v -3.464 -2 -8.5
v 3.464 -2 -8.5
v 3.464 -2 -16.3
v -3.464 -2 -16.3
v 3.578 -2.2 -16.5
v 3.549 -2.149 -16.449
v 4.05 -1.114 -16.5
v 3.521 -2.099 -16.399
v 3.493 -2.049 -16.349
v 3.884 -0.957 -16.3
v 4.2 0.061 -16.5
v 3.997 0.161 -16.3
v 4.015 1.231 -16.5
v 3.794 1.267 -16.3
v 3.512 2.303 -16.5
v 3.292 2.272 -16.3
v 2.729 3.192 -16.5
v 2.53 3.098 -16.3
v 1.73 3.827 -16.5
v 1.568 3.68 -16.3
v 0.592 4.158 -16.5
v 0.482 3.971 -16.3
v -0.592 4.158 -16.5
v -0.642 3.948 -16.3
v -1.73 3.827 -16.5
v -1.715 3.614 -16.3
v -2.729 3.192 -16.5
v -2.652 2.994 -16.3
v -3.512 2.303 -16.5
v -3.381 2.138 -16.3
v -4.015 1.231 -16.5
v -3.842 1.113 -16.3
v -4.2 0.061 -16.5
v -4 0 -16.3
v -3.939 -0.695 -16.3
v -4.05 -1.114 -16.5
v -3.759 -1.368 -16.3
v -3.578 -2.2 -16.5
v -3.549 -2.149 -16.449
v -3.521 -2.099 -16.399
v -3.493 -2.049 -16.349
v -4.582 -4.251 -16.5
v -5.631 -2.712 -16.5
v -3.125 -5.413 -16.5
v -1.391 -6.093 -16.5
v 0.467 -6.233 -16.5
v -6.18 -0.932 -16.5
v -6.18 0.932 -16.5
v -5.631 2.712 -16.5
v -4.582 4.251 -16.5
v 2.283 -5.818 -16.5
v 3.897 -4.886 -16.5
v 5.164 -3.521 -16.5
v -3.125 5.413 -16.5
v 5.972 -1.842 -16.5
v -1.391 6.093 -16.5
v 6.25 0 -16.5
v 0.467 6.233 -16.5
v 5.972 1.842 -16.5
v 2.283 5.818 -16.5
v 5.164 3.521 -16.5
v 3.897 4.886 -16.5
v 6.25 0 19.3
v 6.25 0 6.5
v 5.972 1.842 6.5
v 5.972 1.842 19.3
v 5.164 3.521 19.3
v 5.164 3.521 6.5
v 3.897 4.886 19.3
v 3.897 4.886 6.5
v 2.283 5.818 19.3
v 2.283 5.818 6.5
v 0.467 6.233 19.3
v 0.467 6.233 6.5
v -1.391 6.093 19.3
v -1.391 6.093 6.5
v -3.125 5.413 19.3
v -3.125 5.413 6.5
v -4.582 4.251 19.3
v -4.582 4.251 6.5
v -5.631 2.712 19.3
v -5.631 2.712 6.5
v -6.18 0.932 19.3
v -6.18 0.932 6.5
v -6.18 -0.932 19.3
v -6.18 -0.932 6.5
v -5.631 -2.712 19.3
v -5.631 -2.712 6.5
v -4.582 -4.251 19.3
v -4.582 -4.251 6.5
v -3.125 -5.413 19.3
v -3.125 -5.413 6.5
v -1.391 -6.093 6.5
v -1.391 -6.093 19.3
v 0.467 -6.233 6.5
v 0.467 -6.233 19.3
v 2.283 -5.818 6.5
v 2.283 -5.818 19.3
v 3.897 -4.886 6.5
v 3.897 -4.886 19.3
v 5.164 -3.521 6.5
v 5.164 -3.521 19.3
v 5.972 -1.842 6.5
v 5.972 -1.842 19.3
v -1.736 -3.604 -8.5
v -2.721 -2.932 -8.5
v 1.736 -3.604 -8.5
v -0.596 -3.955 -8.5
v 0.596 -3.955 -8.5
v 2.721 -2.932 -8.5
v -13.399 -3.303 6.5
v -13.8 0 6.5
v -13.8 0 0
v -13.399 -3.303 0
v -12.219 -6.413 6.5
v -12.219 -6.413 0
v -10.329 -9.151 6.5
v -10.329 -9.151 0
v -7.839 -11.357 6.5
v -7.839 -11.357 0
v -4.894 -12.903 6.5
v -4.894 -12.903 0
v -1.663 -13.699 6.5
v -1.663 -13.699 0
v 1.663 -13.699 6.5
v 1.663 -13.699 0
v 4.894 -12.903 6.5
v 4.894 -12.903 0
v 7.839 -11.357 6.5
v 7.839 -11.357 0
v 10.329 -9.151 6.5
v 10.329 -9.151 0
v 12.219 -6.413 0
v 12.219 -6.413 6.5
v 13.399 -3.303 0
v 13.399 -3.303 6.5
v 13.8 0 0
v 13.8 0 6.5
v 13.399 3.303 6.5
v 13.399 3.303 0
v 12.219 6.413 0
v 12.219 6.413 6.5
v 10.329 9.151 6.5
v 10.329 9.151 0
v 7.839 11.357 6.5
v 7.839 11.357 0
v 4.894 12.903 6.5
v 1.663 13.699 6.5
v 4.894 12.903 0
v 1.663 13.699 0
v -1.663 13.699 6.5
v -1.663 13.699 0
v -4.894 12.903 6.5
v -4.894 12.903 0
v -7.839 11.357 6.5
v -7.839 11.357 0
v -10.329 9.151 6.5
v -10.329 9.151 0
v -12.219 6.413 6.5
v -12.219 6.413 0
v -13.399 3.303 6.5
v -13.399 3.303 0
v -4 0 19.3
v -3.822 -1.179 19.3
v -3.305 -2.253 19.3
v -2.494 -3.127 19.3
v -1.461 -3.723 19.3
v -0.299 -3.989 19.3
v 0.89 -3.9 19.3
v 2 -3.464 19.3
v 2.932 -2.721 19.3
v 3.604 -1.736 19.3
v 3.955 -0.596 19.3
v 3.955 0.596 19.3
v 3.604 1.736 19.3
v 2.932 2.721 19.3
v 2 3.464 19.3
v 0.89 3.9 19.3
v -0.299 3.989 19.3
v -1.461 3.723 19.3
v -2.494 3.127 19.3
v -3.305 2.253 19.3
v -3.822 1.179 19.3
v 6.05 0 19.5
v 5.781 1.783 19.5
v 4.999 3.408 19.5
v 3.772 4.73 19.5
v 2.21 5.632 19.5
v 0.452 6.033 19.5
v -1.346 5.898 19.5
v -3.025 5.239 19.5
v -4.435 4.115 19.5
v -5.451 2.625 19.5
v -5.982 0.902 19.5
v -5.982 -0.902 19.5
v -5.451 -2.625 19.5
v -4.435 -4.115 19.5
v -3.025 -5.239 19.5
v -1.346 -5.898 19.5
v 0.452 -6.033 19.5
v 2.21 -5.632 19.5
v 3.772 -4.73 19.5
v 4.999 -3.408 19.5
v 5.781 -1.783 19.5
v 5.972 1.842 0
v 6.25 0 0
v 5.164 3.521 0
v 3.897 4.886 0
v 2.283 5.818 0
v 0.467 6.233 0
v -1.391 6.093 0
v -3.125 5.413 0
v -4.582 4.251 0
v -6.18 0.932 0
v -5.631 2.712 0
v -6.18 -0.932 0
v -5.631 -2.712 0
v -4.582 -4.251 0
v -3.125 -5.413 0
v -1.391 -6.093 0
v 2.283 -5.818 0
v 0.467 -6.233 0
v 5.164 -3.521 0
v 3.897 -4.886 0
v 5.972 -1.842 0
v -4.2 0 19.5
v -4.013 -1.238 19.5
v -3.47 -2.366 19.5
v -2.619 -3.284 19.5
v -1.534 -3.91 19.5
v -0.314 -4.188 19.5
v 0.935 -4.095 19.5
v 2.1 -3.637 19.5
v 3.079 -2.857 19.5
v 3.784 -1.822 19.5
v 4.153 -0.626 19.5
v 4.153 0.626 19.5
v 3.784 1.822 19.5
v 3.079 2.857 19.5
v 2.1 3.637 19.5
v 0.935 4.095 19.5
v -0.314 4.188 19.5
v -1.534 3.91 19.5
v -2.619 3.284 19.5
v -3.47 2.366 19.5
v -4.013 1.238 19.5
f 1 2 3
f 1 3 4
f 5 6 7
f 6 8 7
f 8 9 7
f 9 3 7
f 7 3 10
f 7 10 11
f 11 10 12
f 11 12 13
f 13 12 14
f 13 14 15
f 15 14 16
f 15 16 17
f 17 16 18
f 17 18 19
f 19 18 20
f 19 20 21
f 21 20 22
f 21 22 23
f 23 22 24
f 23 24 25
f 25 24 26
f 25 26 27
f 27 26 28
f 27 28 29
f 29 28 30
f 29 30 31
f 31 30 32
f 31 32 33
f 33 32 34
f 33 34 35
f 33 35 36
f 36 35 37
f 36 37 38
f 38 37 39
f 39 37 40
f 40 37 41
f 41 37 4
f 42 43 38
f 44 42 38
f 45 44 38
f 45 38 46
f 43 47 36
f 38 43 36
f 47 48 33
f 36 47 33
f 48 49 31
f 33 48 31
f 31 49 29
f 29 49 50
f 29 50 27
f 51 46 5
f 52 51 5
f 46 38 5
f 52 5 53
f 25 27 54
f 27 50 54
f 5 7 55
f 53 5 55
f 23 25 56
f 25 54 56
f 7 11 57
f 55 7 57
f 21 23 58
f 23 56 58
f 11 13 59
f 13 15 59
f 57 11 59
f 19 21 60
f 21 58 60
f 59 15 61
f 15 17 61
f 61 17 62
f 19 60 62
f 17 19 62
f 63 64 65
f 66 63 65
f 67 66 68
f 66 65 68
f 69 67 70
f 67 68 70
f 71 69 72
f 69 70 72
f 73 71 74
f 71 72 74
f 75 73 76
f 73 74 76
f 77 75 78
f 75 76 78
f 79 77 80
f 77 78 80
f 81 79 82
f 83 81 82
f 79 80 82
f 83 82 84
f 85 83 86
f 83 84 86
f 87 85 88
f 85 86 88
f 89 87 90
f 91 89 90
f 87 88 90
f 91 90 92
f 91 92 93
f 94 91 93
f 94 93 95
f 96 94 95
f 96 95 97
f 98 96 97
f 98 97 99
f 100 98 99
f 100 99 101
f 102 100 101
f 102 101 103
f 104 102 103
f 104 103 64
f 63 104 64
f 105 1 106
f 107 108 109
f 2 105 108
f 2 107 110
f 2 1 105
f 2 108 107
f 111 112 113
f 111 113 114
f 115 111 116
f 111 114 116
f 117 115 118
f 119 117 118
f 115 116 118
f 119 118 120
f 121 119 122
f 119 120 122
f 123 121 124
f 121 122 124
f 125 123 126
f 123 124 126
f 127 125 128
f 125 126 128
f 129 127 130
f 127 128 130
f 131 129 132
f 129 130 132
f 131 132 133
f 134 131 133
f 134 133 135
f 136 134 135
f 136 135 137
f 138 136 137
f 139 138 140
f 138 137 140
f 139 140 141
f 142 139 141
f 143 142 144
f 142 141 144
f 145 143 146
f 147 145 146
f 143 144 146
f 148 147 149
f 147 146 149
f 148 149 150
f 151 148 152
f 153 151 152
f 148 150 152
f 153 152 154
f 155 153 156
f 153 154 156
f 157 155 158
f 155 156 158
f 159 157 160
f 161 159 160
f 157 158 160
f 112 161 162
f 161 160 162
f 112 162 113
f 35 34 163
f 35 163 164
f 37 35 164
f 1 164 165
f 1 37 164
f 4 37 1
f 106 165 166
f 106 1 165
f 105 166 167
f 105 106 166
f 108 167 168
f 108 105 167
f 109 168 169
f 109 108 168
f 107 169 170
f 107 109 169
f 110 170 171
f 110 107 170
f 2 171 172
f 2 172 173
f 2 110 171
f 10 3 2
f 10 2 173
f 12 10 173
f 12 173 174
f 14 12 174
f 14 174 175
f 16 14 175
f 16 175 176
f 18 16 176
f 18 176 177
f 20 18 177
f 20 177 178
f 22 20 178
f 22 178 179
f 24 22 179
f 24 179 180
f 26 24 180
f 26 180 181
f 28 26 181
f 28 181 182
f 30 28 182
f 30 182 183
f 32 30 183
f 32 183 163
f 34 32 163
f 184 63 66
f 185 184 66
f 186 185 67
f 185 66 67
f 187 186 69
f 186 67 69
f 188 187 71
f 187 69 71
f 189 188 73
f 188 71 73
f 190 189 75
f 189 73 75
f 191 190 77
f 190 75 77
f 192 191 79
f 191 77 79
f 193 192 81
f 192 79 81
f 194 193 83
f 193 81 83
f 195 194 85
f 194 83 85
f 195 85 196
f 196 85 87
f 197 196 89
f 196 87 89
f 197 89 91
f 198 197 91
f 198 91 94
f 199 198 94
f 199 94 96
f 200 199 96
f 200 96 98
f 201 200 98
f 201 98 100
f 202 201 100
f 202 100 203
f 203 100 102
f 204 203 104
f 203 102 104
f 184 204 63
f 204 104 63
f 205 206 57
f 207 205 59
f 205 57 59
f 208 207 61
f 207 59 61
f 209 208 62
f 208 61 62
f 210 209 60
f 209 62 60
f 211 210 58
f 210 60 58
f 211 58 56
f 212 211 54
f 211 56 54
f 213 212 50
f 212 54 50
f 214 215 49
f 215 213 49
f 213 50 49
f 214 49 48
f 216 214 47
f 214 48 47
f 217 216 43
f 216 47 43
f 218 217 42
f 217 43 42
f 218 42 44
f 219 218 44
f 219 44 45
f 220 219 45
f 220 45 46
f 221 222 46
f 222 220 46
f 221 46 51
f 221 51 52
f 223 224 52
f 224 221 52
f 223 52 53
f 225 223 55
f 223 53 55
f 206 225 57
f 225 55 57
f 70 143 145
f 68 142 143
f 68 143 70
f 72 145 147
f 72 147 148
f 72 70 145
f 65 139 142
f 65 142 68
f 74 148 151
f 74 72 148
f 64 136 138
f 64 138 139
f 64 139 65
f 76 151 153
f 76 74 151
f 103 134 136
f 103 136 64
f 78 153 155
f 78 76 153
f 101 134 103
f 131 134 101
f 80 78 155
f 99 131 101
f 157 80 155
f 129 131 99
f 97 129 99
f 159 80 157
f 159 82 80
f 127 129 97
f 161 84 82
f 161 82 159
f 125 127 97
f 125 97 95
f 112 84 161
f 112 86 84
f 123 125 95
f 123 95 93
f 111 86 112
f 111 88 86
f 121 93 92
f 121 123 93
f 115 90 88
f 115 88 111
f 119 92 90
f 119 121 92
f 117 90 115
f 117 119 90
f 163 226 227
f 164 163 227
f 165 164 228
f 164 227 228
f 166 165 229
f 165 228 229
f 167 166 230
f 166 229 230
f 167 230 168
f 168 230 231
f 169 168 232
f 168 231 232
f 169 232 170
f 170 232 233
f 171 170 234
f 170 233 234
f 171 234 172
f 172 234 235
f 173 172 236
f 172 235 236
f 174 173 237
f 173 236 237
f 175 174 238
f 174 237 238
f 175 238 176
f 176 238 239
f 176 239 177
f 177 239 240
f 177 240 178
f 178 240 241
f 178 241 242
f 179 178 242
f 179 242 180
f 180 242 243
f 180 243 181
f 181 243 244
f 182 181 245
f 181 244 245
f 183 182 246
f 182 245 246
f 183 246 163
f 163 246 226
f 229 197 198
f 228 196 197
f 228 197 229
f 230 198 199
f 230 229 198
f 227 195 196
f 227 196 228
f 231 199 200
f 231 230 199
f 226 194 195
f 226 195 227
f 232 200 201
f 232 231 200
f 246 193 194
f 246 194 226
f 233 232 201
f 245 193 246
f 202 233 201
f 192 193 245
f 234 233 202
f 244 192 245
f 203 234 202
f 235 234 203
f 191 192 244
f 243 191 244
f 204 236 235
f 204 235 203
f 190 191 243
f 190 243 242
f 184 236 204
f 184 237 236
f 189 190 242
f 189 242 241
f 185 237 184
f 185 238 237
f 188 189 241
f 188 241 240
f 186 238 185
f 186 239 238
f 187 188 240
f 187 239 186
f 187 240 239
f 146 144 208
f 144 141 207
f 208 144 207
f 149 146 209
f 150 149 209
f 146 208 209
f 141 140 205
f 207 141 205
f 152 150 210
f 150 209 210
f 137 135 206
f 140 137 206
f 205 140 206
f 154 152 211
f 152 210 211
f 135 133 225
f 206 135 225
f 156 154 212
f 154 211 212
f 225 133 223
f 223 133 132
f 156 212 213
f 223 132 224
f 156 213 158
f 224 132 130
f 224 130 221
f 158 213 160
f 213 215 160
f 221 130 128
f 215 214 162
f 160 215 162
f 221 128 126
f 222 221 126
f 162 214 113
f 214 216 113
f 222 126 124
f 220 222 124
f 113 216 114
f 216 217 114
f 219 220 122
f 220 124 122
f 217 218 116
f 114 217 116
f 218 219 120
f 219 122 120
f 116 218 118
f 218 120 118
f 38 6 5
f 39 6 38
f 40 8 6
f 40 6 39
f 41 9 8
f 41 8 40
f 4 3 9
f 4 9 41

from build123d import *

# Parameters (mm, degrees)
SKETCH_1_R           = 13.8
SKETCH_1_R_2         = 4
EXTRUDE_1_DEPTH      = 6.5
EXTRUDE_2_DEPTH      = 13
EXTRUDE_2_DEPTH_BACK = 23
SKETCH_2_R           = 6.25
SKETCH_2_R_2         = 4
EXTRUDE_3_DEPTH      = 8
CHAMFER_1_SIZE       = 0.2


with BuildPart() as part:
    # Эскиз1 → Бобышка-Вытянуть1 (new body)
    with BuildSketch(Plane.XY):
        with Locations(Location((0, 0, 0), (0, 0, 180))):
            Circle(SKETCH_1_R)
        with Locations(Location((0, 0, 0), (0, 0, 180))):
            Circle(SKETCH_1_R_2, mode=Mode.SUBTRACT)
    extrude(amount=EXTRUDE_1_DEPTH)

    # Эскиз2 → Бобышка-Вытянуть2 (add, two sides: drawn at the far end of the back side and taken through both)
    with BuildSketch(Plane.XY.offset(6.5).offset(-EXTRUDE_2_DEPTH_BACK)):
        Circle(SKETCH_2_R)
        with Locations(Location((0, 0, 0), (0, 0, 180))):
            Circle(SKETCH_2_R_2, mode=Mode.SUBTRACT)
    extrude(amount=EXTRUDE_2_DEPTH + EXTRUDE_2_DEPTH_BACK)

    # Эскиз3 → Бобышка-Вытянуть3 (add)
    with BuildSketch(Plane(origin=(0, 0, -16.5), x_dir=(-1, 0, 0), z_dir=(0, 0, -1))):
        with BuildLine():
            Line((-3.464101615, -2), (3.464101615, -2))
            ThreePointArc((3.464101615, -2), (0, -4), (-3.464101615, -2))
        make_face()
    extrude(amount=-EXTRUDE_3_DEPTH)

    # Фаска1
    chamfer_1_edges = [part.edges().sort_by_distance(p)[0] for p in [
        (4, 0, 19.5),
        (-6.25, 0, 19.5),
        (1.03527618, 3.863703305, -16.5),
        (0, -2, -16.5),
    ]]
    chamfer(chamfer_1_edges, length=CHAMFER_1_SIZE)


solid = part.part
